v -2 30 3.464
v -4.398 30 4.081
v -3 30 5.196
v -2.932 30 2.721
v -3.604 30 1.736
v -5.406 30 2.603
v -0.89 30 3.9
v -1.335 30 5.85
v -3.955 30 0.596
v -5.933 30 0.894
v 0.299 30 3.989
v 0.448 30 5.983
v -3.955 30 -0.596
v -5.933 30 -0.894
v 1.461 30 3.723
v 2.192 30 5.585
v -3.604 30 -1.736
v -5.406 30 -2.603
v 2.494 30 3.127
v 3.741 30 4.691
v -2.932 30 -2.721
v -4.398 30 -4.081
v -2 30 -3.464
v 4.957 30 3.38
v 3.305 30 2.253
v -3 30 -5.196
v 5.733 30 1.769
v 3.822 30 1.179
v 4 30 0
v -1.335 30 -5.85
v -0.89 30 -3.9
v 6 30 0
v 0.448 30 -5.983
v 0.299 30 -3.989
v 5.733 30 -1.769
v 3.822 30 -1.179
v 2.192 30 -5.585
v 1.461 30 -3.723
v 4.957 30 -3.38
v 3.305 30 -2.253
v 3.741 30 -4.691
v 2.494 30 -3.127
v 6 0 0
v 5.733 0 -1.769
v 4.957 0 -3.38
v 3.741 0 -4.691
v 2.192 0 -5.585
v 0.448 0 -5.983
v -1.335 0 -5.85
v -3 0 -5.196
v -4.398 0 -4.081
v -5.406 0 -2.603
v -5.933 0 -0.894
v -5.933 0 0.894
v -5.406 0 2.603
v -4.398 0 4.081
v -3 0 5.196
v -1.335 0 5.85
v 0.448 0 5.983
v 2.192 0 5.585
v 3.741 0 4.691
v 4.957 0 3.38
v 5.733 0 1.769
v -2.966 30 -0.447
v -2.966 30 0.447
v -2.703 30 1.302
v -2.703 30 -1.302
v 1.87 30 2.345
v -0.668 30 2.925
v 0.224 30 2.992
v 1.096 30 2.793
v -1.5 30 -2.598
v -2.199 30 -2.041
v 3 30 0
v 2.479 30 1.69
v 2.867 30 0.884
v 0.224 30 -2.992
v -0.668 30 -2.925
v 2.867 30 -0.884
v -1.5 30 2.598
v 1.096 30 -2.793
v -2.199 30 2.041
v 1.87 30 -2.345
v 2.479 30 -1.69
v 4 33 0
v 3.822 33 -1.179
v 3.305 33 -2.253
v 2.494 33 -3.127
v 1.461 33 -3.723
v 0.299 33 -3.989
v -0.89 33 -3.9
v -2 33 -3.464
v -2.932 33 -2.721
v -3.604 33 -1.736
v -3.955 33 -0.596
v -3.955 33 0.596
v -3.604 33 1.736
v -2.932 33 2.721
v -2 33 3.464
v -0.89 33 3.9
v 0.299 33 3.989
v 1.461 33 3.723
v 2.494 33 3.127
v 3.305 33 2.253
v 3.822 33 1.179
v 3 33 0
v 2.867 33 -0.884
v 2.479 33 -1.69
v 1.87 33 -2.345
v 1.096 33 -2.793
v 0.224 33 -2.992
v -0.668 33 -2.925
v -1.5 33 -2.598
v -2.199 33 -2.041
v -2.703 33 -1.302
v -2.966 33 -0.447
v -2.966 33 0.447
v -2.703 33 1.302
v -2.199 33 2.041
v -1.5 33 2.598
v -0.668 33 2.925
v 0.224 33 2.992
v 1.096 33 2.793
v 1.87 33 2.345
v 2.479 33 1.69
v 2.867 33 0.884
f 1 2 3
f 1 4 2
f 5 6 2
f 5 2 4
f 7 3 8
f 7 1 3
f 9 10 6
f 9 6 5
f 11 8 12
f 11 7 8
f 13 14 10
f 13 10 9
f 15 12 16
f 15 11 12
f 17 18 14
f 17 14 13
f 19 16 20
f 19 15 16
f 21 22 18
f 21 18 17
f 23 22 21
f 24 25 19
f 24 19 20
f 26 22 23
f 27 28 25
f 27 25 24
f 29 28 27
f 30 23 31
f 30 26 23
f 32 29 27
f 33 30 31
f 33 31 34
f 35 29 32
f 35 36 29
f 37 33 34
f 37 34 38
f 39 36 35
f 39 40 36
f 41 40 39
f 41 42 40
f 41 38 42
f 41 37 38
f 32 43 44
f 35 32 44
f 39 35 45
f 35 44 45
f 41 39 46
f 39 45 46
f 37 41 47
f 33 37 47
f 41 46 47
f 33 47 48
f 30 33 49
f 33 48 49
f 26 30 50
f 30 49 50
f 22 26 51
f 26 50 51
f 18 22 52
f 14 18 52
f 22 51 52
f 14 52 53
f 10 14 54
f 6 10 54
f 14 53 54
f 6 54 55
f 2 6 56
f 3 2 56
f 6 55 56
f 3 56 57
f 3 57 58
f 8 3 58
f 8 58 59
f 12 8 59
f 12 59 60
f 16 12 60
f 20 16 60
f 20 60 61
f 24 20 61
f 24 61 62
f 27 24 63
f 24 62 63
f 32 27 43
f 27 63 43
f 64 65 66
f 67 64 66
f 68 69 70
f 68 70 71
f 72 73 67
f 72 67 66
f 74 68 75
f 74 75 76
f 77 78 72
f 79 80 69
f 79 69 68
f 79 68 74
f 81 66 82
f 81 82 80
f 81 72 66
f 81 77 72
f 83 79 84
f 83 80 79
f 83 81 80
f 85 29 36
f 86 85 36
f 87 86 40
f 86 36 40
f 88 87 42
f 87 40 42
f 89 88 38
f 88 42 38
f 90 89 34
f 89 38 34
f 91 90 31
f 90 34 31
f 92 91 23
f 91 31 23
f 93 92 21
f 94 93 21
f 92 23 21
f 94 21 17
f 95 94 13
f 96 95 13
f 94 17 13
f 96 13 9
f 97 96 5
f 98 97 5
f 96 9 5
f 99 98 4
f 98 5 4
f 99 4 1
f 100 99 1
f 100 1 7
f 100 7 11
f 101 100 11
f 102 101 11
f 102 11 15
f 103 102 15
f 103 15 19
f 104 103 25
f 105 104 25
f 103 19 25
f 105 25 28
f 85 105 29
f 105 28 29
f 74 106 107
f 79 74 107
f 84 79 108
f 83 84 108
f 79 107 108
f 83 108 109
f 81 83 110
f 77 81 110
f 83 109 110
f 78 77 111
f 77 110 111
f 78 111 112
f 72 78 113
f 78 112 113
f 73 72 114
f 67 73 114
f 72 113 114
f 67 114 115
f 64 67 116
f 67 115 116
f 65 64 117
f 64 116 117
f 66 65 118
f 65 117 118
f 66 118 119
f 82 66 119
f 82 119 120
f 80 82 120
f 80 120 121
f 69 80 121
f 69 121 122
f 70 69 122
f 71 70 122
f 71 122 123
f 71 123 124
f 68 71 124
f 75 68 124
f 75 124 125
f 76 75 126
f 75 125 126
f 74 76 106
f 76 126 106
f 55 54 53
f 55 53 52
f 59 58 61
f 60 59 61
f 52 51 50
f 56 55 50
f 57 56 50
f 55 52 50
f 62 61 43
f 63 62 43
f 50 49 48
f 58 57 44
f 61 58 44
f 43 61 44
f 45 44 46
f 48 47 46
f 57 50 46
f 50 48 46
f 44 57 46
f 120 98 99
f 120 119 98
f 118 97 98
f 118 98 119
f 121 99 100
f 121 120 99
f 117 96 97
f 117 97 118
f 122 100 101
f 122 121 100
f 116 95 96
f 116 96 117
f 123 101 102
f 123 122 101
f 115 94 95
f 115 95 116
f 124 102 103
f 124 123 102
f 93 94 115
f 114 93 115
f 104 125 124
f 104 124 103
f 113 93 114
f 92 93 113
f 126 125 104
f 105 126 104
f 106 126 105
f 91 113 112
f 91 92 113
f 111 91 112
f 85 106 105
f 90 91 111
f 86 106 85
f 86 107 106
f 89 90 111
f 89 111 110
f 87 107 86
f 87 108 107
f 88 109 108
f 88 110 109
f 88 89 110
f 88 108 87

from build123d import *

# Parameters (mm, degrees)
SKETCH2_R           = 6
BOSS_EXTRUDE1_DEPTH = 30
SKETCH3_R           = 4
BOSS_EXTRUDE2_DEPTH = 3
SKETCH4_R           = 3
CUT_EXTRUDE1_DEPTH  = 3


with BuildPart() as part:
    # Sketch2 → Boss-Extrude1 (new body)
    with BuildSketch(Plane(origin=(0, 0, 0), x_dir=(1, 0, 0), z_dir=(0, 1, 0))):
        Circle(SKETCH2_R)
    extrude(amount=BOSS_EXTRUDE1_DEPTH)

    # Sketch3 → Boss-Extrude2 (add)
    with BuildSketch(Plane(origin=(0, 30, 0), x_dir=(1, 0, 0), z_dir=(0, 1, 0))):
        Circle(SKETCH3_R)
    extrude(amount=BOSS_EXTRUDE2_DEPTH)

    # Sketch4 → Cut-Extrude1 (cut)
    with BuildSketch(Plane(origin=(0, 33, 0), x_dir=(1, 0, 0), z_dir=(0, 1, 0))):
        Circle(SKETCH4_R)
    extrude(amount=-CUT_EXTRUDE1_DEPTH, mode=Mode.SUBTRACT)


solid = part.part
